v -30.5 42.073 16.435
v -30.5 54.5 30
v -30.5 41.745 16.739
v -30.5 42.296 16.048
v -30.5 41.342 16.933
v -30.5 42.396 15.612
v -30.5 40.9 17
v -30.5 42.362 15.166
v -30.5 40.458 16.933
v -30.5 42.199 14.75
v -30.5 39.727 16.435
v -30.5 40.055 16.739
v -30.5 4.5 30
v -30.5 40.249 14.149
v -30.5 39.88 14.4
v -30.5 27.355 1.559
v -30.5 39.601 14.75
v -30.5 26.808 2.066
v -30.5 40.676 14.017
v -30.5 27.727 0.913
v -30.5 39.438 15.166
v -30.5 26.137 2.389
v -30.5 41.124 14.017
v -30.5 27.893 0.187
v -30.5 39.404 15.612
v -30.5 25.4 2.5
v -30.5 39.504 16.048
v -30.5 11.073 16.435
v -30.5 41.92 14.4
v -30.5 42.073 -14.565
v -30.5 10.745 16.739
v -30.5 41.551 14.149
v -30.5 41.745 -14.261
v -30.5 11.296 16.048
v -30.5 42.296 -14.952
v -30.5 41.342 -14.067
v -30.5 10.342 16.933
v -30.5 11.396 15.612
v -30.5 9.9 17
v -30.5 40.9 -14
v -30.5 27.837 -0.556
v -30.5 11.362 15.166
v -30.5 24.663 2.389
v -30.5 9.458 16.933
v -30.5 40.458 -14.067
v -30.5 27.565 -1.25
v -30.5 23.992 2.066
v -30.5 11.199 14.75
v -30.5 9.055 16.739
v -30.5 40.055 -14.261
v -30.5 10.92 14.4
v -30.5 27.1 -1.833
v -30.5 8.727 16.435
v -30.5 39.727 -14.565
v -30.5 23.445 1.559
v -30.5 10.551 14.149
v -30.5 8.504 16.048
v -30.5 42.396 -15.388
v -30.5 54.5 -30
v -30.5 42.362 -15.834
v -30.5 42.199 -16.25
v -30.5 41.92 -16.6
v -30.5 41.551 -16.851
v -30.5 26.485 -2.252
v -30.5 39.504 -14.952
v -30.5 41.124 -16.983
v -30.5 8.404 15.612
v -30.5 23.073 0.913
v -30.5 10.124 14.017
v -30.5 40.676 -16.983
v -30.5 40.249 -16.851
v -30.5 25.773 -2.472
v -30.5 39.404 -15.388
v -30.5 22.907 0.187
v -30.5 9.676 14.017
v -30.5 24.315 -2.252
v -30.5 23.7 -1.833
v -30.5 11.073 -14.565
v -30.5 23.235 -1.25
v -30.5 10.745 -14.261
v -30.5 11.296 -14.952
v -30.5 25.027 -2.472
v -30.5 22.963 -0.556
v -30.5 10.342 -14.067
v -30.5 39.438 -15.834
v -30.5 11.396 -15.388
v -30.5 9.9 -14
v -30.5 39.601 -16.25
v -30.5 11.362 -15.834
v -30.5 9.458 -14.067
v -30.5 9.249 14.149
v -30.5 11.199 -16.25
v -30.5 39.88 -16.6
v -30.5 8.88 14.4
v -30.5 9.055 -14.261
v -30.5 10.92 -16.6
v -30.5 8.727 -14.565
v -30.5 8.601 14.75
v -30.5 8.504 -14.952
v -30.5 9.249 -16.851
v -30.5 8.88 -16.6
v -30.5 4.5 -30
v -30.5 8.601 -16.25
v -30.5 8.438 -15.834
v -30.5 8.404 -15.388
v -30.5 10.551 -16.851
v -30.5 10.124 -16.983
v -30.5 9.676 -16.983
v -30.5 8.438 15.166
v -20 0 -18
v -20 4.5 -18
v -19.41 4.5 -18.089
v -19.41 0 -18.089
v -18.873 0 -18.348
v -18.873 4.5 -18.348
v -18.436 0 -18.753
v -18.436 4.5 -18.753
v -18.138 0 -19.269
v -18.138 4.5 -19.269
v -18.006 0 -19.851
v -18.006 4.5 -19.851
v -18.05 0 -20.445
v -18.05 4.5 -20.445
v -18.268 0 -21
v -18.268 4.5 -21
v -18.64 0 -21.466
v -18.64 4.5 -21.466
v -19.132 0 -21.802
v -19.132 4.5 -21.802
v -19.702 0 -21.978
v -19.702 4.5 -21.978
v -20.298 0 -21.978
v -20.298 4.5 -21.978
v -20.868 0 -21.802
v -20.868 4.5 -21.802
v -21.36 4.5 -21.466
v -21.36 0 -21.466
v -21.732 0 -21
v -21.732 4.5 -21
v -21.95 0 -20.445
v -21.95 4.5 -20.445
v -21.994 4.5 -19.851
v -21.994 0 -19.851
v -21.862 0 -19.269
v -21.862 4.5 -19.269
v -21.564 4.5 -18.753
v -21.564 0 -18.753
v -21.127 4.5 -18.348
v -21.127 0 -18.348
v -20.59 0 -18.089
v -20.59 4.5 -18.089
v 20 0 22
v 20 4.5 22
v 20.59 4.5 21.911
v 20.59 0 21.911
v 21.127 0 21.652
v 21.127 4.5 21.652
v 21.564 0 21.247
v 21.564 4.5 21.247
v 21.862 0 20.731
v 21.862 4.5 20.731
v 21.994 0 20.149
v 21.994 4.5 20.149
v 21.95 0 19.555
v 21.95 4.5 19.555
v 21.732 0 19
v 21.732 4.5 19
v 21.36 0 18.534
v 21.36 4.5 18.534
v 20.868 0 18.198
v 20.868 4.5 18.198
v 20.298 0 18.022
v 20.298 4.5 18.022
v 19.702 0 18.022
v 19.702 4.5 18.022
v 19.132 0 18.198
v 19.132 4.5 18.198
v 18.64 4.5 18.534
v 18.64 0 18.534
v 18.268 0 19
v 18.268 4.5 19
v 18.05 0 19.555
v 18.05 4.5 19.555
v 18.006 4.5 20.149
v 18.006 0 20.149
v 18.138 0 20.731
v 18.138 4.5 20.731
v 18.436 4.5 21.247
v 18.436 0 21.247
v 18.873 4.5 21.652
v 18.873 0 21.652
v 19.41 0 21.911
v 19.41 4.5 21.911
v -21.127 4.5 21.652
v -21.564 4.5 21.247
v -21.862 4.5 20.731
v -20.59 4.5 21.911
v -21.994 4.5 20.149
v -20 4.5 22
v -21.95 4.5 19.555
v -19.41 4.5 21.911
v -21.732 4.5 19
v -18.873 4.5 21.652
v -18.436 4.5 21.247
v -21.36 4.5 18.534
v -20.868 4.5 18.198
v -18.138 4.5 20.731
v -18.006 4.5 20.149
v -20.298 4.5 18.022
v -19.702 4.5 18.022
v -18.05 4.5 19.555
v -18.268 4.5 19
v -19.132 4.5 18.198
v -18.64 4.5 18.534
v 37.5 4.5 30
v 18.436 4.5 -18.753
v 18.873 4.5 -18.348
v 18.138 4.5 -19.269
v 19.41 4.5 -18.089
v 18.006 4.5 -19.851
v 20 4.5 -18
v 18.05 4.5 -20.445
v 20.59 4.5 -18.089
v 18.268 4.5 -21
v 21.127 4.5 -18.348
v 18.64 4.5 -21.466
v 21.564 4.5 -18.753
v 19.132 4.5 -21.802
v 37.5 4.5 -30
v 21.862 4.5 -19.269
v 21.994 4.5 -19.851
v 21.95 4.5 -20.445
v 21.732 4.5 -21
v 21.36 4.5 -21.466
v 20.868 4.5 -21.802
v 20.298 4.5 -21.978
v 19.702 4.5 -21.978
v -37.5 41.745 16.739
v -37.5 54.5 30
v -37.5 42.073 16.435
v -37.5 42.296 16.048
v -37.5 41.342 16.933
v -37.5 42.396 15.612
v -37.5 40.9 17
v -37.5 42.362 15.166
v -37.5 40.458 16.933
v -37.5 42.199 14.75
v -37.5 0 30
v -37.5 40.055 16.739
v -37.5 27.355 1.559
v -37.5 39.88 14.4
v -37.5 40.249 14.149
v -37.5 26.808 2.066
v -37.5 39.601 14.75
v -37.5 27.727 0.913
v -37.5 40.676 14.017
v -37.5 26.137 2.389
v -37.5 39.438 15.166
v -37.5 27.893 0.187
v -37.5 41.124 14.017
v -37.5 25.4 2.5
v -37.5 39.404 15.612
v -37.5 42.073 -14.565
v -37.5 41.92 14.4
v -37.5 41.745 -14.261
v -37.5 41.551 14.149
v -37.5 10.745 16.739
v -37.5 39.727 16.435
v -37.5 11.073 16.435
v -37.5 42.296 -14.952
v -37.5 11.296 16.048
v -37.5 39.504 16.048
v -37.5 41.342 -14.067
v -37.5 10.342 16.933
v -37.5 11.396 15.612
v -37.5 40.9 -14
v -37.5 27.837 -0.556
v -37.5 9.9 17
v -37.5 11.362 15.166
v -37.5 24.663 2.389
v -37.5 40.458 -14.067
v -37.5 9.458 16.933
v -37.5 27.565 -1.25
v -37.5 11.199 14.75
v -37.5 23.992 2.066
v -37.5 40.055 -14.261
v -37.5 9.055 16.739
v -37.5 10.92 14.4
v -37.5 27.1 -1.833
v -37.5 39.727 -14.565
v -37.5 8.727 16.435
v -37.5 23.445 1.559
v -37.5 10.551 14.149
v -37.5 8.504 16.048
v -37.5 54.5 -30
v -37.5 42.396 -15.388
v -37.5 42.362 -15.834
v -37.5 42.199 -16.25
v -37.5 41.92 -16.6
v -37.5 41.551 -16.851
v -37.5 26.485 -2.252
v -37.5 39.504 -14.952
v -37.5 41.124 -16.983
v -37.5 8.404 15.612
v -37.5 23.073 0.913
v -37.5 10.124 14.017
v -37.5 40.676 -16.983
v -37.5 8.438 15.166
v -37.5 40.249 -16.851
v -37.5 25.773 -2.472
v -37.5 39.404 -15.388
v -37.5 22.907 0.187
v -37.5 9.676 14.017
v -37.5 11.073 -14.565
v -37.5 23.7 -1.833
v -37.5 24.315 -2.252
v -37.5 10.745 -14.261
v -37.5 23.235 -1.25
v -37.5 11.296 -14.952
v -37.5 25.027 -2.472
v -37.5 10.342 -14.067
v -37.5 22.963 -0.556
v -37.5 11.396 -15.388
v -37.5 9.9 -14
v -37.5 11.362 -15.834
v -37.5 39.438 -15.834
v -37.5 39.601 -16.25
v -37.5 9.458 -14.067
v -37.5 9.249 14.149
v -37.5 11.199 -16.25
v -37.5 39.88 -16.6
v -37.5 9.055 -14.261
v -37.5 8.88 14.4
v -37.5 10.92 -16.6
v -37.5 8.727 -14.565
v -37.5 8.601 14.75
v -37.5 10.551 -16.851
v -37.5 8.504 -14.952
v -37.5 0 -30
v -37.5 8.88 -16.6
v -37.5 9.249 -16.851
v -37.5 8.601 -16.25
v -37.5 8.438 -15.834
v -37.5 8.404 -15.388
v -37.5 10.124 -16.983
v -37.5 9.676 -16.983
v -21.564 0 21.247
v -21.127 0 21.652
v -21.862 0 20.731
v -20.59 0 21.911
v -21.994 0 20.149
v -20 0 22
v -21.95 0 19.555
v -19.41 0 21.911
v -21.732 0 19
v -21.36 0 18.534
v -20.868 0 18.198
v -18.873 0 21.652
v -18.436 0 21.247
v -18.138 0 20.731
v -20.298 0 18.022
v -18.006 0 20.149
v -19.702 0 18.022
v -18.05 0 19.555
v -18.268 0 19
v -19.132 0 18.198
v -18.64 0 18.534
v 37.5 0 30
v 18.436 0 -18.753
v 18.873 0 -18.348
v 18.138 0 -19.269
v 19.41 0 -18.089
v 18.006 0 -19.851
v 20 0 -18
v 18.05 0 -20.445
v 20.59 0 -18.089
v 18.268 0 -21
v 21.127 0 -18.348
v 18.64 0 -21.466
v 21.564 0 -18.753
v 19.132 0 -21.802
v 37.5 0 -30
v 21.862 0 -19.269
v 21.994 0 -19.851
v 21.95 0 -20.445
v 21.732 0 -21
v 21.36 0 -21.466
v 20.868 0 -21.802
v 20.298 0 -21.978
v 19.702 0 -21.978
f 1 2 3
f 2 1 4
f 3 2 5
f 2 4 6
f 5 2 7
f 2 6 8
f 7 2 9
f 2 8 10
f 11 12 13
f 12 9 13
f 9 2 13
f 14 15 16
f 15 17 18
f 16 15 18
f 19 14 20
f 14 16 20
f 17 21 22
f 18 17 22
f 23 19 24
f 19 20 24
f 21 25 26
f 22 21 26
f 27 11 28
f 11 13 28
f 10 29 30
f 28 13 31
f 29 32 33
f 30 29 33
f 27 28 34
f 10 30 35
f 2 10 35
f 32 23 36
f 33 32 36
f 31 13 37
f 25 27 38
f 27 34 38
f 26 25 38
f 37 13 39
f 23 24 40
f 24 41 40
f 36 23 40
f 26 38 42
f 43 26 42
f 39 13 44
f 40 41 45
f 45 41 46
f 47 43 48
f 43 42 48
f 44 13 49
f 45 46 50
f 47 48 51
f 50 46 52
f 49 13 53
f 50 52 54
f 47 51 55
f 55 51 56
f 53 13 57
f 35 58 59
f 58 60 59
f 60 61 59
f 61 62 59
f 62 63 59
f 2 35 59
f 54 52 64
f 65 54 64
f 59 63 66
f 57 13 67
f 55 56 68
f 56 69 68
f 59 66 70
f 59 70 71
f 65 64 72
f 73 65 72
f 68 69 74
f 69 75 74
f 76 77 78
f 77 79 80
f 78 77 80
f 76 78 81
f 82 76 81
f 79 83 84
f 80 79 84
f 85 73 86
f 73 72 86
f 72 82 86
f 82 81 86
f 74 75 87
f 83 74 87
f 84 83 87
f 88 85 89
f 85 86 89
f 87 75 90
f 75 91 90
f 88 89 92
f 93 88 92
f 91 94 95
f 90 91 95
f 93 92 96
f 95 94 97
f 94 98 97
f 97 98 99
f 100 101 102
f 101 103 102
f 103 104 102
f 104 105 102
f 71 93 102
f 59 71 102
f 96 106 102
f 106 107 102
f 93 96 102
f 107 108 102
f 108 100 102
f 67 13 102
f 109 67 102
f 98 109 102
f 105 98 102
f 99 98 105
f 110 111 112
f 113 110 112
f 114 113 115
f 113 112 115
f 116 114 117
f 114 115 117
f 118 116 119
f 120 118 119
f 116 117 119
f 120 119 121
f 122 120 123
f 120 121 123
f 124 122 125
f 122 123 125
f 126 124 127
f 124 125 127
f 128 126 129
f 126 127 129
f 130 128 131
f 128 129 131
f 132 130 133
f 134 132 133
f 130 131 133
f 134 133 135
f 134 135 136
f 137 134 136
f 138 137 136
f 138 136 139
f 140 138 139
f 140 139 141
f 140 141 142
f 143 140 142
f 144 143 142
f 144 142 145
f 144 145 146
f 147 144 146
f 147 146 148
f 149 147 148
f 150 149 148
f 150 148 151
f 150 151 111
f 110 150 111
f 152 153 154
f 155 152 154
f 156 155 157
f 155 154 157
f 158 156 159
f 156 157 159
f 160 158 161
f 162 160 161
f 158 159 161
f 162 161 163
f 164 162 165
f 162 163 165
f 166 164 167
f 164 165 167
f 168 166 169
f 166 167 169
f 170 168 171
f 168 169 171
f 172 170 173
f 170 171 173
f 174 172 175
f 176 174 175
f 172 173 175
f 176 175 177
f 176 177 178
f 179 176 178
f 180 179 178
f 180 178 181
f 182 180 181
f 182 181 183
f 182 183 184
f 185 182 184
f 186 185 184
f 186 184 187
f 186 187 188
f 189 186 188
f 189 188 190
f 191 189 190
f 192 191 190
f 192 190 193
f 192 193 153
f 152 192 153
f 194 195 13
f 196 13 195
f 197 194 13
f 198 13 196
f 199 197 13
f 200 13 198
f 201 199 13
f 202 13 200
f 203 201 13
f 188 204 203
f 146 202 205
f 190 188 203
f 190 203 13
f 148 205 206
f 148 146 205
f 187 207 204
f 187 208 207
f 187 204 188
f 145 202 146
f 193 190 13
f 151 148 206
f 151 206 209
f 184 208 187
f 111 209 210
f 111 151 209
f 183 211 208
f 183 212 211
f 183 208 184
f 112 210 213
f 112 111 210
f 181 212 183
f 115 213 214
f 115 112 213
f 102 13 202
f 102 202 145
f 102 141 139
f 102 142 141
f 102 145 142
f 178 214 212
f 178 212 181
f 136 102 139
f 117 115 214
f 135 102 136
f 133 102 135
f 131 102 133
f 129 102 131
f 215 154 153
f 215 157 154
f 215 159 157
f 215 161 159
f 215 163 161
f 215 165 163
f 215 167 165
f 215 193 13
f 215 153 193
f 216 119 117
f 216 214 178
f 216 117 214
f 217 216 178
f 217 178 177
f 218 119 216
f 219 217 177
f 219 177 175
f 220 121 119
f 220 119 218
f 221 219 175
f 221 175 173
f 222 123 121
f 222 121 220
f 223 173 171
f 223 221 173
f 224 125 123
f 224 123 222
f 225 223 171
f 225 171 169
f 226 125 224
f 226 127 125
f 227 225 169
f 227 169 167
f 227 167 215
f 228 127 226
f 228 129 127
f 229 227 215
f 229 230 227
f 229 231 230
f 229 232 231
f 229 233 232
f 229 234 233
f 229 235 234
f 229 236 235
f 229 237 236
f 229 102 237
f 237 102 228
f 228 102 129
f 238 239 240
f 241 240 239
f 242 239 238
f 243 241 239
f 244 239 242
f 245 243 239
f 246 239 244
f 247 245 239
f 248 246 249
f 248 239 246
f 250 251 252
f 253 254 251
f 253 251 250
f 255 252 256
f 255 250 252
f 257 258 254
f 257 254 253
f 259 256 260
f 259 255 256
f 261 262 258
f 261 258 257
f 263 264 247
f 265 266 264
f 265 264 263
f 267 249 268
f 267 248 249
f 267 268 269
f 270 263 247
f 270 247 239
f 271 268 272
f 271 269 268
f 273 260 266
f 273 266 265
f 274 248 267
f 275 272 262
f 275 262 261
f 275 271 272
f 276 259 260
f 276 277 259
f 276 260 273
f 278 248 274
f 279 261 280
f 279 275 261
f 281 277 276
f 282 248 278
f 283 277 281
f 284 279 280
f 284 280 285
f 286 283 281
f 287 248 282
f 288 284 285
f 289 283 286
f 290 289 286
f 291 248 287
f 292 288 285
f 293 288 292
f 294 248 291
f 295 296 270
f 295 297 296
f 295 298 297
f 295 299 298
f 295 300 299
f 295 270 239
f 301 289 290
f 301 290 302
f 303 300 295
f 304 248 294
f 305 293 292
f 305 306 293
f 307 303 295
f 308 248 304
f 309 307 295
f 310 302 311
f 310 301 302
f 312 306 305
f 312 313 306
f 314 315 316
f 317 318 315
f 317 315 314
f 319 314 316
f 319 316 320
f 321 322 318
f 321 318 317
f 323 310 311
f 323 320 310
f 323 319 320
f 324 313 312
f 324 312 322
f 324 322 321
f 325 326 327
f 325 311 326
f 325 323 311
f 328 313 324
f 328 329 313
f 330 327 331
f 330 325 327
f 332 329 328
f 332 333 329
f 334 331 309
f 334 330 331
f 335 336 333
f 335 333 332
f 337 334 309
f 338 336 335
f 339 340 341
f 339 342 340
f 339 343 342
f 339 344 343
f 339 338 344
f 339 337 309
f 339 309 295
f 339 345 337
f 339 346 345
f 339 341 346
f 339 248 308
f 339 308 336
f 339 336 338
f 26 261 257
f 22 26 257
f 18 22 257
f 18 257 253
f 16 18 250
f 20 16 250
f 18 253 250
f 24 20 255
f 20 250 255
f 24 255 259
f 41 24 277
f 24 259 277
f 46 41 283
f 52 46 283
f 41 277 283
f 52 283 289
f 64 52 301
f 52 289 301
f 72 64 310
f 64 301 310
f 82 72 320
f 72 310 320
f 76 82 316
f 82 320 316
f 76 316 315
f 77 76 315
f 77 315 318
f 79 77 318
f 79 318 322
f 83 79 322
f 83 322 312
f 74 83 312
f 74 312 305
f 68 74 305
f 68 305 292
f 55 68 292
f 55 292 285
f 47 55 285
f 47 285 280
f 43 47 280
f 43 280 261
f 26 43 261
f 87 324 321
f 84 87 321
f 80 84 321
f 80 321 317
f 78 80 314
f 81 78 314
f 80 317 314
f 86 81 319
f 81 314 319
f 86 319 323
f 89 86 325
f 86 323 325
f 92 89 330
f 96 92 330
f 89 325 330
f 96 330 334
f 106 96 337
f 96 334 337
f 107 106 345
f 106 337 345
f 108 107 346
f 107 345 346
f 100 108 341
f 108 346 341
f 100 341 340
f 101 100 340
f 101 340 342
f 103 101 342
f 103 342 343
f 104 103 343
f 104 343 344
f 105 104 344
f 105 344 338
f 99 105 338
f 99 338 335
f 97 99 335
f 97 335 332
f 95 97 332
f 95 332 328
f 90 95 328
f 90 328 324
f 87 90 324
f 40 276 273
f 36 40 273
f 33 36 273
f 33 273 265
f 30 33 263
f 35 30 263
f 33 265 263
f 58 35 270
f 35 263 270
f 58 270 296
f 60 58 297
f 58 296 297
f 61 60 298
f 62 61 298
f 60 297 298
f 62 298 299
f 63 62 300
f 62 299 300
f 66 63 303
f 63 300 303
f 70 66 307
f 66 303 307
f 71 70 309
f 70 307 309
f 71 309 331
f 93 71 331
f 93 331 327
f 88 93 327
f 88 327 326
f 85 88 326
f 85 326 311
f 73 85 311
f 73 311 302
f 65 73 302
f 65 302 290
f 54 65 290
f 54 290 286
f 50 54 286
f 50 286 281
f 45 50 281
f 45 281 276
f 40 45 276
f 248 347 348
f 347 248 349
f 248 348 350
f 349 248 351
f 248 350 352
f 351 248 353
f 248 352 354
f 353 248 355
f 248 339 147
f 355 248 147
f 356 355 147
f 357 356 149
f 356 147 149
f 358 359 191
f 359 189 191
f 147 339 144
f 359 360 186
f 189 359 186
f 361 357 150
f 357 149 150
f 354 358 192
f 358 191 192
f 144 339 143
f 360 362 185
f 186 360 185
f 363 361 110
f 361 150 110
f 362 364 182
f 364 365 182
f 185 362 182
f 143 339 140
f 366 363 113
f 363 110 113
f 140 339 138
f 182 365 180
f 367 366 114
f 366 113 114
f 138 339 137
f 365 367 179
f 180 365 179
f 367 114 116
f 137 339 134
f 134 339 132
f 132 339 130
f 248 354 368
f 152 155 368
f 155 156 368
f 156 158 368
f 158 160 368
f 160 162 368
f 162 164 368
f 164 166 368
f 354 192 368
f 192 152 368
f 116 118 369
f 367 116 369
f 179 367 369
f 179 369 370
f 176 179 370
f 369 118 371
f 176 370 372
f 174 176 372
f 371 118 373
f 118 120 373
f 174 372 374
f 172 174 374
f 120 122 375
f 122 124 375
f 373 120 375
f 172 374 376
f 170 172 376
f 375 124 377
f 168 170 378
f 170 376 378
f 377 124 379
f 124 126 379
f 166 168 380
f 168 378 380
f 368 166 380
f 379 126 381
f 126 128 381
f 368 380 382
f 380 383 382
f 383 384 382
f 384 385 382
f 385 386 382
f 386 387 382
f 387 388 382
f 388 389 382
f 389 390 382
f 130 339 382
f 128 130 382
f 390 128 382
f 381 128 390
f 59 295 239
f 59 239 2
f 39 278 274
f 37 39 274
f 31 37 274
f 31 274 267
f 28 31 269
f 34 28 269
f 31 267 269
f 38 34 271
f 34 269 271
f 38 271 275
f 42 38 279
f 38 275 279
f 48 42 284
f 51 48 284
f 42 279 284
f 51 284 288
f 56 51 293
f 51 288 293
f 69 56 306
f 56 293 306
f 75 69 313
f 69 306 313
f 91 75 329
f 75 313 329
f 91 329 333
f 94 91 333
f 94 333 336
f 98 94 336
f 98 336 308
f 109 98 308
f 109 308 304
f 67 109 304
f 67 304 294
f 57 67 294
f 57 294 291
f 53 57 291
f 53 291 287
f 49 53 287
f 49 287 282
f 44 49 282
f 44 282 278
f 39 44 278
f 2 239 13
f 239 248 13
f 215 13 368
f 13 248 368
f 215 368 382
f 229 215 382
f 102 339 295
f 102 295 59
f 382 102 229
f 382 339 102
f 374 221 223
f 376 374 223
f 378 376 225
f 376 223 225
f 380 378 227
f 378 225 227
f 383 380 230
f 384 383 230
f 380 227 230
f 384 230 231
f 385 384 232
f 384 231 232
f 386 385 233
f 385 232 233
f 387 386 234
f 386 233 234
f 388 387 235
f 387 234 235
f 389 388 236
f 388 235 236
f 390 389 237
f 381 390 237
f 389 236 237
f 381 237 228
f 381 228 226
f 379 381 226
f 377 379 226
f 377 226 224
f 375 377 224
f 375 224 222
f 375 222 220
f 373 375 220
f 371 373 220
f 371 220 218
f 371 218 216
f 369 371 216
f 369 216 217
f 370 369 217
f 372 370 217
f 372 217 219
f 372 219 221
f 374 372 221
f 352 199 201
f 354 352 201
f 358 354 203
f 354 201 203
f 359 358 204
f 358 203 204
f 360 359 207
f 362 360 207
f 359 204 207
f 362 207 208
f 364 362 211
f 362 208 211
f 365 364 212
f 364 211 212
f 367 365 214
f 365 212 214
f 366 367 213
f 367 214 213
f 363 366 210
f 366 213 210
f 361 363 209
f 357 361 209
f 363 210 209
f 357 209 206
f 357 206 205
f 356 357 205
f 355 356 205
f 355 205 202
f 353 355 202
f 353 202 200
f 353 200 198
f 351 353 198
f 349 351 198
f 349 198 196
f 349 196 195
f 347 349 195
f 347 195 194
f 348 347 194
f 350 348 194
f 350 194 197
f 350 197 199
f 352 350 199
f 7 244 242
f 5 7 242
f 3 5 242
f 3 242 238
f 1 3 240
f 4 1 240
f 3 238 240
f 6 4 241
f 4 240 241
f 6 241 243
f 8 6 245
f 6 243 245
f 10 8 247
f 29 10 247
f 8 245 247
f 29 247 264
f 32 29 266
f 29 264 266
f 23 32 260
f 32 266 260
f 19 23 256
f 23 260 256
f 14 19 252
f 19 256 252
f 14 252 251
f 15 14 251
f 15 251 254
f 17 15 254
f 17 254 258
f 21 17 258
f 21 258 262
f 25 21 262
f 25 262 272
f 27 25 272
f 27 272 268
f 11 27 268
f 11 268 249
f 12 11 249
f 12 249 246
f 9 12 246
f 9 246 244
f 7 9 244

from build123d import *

# Parameters (mm, degrees)
SKETCH1_W           = 75
SKETCH1_H           = 60
BOSS_EXTRUDE1_DEPTH = 4.5
SKETCH2_W           = 7
SKETCH2_H           = 60
BOSS_EXTRUDE2_DEPTH = 50
SKETCH3_R           = 1.5
SKETCH3_R_2         = 2.5
CUT_EXTRUDE1_DEPTH  = 10
SKETCH6_R           = 2
CUT_EXTRUDE2_DEPTH  = 10


with BuildPart() as part:
    # Sketch1 → Boss-Extrude1 (new body)
    with BuildSketch(Plane(origin=(0, 0, 0), x_dir=(1, 0, 0), z_dir=(0, 1, 0))):
        Rectangle(SKETCH1_W, SKETCH1_H)
    extrude(amount=BOSS_EXTRUDE1_DEPTH)

    # Sketch2 → Boss-Extrude2 (add)
    with BuildSketch(Plane(origin=(0, 4.5, 0), x_dir=(1, 0, 0), z_dir=(0, 1, 0))):
        with Locations((-34, 0)):
            Rectangle(SKETCH2_W, SKETCH2_H)
    extrude(amount=BOSS_EXTRUDE2_DEPTH)

    # Sketch3 → Cut-Extrude1 (cut)
    with BuildSketch(Plane.ZY.offset(37.5)):
        with Locations((-15.5, 40.9)):
            Circle(SKETCH3_R)
        with Locations((15.5, 40.9)):
            Circle(SKETCH3_R)
        with Locations((15.5, 9.9)):
            Circle(SKETCH3_R)
        with Locations((-15.5, 9.9)):
            Circle(SKETCH3_R)
        with Locations((0, 25.4)):
            Circle(SKETCH3_R_2)
    extrude(amount=-CUT_EXTRUDE1_DEPTH, mode=Mode.SUBTRACT)

    # Sketch6 → Cut-Extrude2 (cut)
    with BuildSketch(Plane(origin=(0, 4.5, 0), x_dir=(1, 0, 0), z_dir=(0, 1, 0))):
        with Locations(Location((20, 20, 0), (0, 0, 270))):
            Circle(SKETCH6_R)
        with Locations(Location((-20, 20, 0), (0, 0, 270))):
            Circle(SKETCH6_R)
        with Locations(Location((20, -20, 0), (0, 0, 270))):
            Circle(SKETCH6_R)
        with Locations(Location((-20, -20, 0), (0, 0, 270))):
            Circle(SKETCH6_R)
    extrude(amount=-CUT_EXTRUDE2_DEPTH, mode=Mode.SUBTRACT)


solid = part.part
